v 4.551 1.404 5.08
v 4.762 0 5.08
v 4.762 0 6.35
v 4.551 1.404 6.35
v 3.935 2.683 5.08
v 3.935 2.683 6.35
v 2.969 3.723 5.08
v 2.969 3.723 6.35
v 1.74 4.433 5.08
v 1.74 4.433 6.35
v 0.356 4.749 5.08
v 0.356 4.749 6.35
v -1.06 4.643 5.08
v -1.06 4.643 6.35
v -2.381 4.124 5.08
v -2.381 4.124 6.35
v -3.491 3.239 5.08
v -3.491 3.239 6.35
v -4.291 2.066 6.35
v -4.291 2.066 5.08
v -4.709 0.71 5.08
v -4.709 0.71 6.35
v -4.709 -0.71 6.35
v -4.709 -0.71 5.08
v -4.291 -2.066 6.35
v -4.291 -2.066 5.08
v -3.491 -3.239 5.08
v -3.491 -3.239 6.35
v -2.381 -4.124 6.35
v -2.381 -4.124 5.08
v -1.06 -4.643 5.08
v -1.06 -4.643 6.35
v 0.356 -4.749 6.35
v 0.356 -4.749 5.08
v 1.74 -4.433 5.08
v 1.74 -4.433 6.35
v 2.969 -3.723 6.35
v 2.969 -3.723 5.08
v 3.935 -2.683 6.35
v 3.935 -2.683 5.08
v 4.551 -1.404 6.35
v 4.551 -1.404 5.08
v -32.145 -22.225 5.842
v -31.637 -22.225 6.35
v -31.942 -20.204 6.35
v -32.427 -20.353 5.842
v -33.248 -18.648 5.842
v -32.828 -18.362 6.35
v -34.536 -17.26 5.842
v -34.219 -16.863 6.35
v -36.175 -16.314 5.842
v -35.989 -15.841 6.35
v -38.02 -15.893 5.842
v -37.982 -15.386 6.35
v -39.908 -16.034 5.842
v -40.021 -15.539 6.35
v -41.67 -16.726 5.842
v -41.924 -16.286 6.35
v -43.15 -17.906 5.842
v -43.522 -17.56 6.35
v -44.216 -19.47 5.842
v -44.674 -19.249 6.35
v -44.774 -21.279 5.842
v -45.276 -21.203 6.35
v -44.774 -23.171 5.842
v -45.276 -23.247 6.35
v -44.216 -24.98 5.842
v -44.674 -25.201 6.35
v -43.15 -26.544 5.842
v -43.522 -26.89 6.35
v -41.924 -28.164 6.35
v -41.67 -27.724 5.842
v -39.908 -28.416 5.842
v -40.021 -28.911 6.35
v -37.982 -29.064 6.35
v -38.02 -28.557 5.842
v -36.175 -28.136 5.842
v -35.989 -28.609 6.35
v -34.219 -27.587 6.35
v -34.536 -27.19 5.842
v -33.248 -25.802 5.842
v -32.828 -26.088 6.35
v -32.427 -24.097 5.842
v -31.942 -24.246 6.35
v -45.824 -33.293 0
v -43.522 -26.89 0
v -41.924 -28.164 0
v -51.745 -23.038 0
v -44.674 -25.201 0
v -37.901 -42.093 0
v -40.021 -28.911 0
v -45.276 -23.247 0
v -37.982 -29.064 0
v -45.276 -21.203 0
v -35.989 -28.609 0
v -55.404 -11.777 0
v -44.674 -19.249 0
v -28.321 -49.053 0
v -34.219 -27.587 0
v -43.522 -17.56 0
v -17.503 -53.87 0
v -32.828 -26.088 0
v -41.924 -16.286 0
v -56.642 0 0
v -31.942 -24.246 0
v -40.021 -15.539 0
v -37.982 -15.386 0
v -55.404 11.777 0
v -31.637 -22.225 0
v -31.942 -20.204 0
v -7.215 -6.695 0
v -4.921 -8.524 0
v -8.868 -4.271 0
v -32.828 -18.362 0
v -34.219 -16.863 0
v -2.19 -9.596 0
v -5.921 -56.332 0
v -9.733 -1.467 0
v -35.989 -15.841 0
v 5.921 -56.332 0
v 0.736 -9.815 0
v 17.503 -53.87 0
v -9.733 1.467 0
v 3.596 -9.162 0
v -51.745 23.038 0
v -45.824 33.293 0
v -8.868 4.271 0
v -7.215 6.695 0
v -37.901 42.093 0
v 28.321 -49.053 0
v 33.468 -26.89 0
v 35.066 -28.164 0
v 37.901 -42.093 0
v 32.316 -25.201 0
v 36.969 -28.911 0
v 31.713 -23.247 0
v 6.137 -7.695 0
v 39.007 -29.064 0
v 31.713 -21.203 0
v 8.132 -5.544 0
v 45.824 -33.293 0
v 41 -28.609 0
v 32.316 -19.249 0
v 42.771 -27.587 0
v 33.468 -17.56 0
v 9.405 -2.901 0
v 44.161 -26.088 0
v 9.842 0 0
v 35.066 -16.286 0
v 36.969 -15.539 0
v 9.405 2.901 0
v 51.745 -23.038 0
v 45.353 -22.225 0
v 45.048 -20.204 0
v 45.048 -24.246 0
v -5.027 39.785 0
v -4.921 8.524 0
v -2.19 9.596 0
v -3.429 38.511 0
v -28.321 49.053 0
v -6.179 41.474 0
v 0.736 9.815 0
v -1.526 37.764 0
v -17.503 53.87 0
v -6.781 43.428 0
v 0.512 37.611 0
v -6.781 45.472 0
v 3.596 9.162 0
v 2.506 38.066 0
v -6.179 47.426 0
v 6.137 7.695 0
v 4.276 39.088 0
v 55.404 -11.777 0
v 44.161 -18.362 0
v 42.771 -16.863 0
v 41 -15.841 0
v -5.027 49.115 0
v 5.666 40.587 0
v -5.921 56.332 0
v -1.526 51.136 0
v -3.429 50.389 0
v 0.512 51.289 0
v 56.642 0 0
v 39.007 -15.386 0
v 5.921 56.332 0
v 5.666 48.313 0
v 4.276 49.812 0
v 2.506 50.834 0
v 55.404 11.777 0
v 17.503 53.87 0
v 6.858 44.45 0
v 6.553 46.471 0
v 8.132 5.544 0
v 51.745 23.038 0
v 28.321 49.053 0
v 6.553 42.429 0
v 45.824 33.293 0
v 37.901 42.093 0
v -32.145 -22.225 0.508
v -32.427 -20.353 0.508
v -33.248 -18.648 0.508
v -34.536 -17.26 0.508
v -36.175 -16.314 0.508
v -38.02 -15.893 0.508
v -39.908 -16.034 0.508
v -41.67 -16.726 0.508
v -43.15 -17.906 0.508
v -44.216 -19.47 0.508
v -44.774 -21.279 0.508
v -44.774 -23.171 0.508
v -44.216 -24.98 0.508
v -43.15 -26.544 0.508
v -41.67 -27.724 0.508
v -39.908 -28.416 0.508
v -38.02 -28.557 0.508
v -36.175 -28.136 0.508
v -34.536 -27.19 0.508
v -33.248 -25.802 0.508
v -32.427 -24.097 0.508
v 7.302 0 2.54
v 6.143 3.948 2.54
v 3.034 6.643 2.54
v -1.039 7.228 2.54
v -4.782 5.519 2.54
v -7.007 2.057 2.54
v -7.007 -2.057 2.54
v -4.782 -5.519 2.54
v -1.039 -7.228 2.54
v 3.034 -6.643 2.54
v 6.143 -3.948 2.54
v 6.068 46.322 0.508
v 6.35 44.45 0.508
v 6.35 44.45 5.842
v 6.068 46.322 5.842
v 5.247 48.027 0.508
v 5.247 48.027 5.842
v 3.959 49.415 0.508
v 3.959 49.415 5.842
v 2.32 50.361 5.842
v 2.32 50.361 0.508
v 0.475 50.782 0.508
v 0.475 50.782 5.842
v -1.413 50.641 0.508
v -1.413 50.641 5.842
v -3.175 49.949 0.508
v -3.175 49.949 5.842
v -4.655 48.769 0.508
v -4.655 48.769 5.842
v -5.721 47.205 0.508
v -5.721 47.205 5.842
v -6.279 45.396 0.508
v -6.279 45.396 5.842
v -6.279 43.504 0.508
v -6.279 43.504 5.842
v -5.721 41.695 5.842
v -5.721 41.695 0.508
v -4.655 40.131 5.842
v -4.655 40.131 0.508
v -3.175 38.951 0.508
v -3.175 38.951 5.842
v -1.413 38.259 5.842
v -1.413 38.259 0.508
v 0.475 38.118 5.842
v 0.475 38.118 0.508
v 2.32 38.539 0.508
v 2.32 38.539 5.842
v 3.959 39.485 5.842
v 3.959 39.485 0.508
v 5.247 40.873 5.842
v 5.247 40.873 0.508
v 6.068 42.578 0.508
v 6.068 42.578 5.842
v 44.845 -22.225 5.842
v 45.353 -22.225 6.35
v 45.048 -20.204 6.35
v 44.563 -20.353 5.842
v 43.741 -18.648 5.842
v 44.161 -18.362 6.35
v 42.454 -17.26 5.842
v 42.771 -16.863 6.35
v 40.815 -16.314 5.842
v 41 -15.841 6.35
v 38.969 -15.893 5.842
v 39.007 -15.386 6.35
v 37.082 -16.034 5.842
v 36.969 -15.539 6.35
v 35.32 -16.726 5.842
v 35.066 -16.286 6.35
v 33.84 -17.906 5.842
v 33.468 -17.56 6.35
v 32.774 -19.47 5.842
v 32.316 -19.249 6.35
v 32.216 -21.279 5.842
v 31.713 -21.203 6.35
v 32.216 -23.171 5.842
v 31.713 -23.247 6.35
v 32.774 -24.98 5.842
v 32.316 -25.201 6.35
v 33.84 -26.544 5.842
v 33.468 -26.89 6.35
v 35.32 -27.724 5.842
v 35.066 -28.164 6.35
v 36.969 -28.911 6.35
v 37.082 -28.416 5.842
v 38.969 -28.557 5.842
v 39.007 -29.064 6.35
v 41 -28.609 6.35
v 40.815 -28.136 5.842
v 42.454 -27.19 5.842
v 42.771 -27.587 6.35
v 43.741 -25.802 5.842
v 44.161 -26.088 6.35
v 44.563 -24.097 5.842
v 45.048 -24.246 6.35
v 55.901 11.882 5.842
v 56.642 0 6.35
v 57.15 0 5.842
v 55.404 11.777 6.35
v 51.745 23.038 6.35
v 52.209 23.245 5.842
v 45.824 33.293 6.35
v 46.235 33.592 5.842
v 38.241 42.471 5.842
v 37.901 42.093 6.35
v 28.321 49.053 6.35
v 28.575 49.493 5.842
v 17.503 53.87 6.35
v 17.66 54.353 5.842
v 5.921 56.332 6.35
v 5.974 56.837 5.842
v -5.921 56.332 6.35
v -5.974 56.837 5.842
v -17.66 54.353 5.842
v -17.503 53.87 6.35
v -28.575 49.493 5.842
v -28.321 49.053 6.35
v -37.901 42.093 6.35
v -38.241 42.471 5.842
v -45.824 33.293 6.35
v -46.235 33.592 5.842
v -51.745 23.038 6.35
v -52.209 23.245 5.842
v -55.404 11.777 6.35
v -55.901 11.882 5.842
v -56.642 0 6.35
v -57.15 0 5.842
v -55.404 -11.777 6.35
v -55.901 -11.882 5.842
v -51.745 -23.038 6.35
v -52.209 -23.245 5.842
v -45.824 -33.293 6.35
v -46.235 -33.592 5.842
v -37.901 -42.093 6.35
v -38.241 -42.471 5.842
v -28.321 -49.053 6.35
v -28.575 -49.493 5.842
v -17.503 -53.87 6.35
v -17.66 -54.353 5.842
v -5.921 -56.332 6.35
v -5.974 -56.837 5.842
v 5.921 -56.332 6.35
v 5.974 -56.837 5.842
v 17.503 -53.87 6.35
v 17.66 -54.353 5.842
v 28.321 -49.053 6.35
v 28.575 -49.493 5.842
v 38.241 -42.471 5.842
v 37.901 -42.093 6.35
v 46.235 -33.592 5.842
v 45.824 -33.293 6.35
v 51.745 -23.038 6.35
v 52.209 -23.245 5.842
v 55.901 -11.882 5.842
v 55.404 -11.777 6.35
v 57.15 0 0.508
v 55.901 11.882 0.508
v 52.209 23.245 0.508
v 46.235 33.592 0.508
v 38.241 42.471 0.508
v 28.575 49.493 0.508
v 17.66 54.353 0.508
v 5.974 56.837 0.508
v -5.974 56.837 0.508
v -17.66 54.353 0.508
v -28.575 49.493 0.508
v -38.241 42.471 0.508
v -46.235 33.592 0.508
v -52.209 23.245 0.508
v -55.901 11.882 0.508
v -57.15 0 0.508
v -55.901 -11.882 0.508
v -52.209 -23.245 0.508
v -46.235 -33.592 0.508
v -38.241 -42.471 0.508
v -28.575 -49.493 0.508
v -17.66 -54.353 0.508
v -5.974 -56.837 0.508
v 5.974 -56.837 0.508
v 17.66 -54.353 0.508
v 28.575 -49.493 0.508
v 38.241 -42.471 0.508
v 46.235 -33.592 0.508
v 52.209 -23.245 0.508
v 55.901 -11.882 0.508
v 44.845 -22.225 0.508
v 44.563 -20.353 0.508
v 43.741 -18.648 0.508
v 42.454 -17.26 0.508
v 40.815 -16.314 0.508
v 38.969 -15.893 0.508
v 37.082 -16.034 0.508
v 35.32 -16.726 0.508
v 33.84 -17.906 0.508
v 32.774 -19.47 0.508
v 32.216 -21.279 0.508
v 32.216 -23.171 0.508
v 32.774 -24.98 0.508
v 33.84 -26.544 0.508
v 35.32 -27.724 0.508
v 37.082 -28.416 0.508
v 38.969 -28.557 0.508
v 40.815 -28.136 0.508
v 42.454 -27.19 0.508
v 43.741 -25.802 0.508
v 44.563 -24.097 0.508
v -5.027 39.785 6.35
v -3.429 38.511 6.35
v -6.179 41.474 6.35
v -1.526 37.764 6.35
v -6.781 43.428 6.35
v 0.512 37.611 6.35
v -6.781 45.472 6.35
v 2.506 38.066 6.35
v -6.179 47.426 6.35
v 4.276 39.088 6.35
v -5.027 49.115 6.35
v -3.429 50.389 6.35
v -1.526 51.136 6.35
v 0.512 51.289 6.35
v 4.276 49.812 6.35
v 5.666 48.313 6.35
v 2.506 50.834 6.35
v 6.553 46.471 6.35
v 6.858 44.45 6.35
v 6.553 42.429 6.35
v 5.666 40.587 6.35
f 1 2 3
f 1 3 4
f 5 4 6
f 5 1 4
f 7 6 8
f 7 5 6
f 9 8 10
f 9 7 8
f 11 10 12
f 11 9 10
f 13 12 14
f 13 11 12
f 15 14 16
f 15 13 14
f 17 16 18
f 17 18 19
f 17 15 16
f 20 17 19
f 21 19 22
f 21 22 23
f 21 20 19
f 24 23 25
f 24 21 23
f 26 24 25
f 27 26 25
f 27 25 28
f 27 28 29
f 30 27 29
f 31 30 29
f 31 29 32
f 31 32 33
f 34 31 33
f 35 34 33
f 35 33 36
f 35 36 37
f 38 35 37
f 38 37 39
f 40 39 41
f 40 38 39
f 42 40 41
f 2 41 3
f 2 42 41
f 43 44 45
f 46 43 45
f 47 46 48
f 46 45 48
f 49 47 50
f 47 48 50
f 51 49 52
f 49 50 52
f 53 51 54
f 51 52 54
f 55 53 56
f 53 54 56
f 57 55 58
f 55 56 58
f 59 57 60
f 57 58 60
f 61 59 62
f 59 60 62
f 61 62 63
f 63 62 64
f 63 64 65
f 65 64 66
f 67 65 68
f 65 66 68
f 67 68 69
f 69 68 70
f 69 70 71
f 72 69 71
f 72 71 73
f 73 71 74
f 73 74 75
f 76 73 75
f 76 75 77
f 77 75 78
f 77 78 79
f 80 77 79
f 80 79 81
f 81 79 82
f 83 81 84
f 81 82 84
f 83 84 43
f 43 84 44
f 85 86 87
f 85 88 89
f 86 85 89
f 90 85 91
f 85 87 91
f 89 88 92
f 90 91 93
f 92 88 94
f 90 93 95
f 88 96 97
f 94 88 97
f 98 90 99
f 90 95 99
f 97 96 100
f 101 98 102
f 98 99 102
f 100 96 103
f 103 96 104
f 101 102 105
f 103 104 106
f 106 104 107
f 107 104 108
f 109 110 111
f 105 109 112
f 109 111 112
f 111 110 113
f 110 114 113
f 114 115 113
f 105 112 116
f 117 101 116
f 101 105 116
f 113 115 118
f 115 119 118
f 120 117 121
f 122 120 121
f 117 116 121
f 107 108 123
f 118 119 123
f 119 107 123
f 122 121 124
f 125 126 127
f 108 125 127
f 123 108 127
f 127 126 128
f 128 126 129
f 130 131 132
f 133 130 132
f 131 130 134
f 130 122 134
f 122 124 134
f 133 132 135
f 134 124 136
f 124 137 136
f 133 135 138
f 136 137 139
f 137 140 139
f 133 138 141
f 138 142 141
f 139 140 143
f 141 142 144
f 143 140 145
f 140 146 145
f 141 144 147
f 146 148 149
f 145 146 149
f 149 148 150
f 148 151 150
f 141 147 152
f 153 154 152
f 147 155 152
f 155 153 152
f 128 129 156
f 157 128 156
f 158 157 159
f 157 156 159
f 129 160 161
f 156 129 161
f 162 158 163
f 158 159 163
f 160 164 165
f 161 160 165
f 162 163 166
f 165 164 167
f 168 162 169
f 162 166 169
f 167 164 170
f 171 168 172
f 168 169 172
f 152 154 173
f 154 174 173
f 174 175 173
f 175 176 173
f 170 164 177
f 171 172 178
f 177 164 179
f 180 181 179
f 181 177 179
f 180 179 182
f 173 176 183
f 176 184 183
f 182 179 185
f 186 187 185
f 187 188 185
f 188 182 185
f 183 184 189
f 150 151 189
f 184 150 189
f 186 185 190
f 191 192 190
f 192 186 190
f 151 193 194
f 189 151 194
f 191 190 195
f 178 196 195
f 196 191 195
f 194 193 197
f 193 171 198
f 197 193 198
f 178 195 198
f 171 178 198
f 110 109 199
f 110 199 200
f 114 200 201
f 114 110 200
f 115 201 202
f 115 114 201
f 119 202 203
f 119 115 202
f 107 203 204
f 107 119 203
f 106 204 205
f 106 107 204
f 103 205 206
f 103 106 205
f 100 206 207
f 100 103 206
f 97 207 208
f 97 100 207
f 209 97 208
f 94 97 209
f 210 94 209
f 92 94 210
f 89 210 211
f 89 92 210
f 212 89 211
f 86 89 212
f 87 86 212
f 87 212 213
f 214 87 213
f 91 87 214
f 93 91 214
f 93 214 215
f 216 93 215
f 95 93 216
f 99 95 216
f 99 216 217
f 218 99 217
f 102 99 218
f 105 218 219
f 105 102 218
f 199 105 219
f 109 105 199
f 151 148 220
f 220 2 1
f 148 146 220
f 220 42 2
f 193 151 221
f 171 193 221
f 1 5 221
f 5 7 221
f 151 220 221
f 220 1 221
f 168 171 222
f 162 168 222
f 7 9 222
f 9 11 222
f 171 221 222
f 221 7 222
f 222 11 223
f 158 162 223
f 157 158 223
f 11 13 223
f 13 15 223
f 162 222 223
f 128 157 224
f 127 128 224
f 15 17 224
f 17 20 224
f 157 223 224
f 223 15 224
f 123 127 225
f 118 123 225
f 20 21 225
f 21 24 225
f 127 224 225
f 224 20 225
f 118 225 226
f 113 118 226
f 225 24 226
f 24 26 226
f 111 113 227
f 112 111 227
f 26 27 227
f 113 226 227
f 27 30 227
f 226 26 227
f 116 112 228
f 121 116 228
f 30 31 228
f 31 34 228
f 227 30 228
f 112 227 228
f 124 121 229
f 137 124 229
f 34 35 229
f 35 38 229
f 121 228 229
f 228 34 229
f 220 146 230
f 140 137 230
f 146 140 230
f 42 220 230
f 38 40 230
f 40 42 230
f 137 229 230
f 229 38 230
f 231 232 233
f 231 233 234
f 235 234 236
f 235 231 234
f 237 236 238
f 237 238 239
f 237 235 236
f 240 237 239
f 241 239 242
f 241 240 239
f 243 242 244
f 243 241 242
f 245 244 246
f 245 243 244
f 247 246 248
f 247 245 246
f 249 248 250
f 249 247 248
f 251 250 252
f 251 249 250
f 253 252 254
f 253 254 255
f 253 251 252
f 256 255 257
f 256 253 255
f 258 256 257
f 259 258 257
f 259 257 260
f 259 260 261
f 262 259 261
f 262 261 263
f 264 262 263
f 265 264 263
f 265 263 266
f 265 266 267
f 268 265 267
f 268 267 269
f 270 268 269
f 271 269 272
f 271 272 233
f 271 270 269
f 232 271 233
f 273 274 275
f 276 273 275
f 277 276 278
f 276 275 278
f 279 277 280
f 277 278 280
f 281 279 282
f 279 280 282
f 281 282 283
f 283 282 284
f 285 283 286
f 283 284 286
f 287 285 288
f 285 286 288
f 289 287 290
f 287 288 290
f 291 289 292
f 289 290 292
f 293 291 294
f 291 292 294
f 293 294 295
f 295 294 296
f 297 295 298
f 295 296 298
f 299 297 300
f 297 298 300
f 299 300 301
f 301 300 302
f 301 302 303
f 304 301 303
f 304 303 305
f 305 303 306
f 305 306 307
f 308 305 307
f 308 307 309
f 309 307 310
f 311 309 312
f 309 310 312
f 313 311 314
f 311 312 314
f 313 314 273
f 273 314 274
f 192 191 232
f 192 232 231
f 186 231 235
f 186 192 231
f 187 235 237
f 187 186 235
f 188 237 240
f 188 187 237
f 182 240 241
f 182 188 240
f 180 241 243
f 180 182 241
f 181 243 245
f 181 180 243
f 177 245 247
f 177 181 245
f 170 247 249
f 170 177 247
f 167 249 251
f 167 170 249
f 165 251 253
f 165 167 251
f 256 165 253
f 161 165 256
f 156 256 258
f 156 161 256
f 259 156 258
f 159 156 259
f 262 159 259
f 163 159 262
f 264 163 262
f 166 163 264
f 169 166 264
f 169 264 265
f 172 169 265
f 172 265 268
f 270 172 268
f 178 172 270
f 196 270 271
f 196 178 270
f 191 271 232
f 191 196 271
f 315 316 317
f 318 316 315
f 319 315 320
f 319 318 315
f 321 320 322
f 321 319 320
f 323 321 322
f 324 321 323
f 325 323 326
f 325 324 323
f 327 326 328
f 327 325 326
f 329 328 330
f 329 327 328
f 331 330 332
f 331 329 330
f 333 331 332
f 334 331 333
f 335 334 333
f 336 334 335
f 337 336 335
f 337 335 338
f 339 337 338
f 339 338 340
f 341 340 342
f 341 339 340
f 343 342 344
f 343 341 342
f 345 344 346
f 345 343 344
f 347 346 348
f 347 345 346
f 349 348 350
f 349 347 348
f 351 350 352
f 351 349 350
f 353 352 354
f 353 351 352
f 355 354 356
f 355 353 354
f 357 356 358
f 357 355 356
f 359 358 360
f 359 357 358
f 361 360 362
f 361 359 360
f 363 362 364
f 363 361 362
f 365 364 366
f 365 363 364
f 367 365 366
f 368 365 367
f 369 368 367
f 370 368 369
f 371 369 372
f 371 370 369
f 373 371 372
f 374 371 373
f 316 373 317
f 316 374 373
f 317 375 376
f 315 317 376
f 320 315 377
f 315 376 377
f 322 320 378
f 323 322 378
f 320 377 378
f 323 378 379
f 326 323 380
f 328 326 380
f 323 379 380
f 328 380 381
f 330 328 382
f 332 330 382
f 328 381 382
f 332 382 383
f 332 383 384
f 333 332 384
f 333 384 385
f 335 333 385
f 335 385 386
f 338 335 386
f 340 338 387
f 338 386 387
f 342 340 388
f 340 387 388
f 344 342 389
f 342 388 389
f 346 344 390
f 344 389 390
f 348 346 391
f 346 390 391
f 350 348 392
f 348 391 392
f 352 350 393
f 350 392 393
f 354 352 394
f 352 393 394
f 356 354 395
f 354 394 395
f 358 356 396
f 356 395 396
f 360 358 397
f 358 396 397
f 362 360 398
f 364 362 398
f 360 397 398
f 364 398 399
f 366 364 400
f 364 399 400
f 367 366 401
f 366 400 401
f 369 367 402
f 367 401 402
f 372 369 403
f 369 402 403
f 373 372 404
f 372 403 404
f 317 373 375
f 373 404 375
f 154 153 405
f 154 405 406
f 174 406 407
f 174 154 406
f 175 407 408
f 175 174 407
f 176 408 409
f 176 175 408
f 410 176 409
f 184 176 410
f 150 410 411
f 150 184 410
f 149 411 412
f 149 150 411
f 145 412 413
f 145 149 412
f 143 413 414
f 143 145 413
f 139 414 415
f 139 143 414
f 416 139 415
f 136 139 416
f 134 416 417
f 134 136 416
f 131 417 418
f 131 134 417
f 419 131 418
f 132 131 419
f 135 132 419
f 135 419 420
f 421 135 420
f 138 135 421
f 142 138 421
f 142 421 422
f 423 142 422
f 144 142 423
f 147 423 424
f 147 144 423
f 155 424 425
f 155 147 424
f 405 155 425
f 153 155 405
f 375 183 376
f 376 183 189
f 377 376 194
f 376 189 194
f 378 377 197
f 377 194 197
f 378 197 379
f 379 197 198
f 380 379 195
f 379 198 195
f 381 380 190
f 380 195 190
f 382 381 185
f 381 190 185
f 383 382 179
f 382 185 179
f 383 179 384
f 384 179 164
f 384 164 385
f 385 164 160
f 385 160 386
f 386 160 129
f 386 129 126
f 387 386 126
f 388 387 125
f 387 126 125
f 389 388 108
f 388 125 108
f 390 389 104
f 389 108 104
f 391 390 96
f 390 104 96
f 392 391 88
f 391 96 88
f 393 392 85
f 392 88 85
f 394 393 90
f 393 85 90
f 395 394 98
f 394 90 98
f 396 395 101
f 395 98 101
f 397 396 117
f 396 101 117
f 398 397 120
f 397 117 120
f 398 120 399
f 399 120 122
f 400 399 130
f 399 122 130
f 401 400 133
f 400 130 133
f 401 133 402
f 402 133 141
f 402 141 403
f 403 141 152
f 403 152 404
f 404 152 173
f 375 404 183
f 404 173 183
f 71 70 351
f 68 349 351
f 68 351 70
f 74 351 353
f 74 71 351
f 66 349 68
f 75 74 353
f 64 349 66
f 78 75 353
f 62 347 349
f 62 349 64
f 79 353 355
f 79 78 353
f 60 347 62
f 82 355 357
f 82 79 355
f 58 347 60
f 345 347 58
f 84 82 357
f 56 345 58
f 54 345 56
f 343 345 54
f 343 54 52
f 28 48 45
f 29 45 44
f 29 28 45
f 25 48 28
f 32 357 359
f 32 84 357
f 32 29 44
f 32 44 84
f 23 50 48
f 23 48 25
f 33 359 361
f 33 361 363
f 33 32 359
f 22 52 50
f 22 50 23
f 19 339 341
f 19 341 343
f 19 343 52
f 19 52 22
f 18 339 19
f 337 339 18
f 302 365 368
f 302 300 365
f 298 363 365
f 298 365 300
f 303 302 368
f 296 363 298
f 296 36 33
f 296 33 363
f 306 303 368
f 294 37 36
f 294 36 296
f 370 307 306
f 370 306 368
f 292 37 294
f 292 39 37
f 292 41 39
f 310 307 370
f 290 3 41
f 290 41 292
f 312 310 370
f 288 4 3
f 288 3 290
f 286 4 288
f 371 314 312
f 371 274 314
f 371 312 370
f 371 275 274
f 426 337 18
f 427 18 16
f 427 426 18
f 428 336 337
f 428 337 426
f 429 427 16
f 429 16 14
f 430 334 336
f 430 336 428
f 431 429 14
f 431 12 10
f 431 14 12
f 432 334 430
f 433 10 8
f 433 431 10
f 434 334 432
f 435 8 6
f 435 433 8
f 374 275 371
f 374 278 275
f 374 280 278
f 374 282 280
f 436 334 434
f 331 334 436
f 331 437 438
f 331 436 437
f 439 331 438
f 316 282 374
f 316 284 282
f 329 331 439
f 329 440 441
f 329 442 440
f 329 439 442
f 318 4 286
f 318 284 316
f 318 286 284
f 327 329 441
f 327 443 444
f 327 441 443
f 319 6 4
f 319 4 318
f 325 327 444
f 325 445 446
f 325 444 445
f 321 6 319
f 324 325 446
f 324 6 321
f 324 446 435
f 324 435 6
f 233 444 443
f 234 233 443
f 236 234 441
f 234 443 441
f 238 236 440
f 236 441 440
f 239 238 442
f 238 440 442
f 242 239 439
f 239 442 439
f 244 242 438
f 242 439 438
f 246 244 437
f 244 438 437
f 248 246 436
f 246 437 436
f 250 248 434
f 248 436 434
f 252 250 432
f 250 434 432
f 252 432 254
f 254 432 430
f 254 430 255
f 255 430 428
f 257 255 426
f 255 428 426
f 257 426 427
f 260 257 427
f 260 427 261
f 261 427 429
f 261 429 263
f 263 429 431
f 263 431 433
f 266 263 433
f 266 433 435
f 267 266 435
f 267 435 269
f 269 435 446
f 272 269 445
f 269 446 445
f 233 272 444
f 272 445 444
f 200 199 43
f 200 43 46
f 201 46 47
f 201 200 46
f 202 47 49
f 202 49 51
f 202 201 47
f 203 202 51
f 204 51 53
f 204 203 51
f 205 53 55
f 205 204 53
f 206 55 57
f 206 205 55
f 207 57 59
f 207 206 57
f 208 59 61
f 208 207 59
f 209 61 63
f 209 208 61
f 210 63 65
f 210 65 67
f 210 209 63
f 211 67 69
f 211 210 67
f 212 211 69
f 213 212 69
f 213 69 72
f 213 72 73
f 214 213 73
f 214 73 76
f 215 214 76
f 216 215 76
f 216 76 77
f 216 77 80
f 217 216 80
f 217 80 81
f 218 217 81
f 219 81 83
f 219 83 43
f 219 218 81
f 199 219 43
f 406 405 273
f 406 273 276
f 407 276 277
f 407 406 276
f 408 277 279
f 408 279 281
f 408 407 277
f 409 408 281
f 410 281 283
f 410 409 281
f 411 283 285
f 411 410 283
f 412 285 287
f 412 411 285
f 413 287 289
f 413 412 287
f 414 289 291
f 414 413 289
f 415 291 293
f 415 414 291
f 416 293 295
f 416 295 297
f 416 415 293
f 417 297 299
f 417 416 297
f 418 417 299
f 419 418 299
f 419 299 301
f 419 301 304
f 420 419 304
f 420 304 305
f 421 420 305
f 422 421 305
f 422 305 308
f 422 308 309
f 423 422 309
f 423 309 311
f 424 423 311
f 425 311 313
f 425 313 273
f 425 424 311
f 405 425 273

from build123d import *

# Parameters (mm, degrees)
F0_R     = 57.15
F0_R_2   = 6.35
F0_R_3   = 4.7625
F1_DEPTH = 6.35
F2_SIZE  = 0.508
F3_SIZE  = 5.08


# Not quite as in the source:
# - a feature names something its author has since deleted; it is built from what else it names


with BuildPart() as f1:
    # F0 (on Top) → F1 (new body)
    with BuildSketch(Plane.XY):
        Circle(F0_R)
        with Locations((-38.4948291982, -22.225)):
            Circle(F0_R_2, mode=Mode.SUBTRACT)
        with Locations((38.4948291982, -22.225)):
            Circle(F0_R_2, mode=Mode.SUBTRACT)
        Circle(F0_R_3, mode=Mode.SUBTRACT)
        with Locations((0, 44.45)):
            Circle(F0_R_2, mode=Mode.SUBTRACT)
    extrude(amount=F1_DEPTH)

    # F2
    f2_edges = [f1.edges().sort_by_distance(p)[0] for p in [
        (-57.15, 0, 6.35),
        (-6.35, 44.45, 6.35),
        (-44.844829, -22.225, 6.35),
        (32.144829, -22.225, 6.35),
        (-57.15, 0, 0),
        (-6.35, 44.45, 0),
        (32.144829, -22.225, 0),
        (-44.844829, -22.225, 0),
    ]]
    chamfer(f2_edges, length=F2_SIZE)

    # F3
    f3_edges = [f1.edges().sort_by_distance(p)[0] for p in [
        (-4.7625, 0, 0),
    ]]
    chamfer(f3_edges, length=F3_SIZE)


solid = f1.part
